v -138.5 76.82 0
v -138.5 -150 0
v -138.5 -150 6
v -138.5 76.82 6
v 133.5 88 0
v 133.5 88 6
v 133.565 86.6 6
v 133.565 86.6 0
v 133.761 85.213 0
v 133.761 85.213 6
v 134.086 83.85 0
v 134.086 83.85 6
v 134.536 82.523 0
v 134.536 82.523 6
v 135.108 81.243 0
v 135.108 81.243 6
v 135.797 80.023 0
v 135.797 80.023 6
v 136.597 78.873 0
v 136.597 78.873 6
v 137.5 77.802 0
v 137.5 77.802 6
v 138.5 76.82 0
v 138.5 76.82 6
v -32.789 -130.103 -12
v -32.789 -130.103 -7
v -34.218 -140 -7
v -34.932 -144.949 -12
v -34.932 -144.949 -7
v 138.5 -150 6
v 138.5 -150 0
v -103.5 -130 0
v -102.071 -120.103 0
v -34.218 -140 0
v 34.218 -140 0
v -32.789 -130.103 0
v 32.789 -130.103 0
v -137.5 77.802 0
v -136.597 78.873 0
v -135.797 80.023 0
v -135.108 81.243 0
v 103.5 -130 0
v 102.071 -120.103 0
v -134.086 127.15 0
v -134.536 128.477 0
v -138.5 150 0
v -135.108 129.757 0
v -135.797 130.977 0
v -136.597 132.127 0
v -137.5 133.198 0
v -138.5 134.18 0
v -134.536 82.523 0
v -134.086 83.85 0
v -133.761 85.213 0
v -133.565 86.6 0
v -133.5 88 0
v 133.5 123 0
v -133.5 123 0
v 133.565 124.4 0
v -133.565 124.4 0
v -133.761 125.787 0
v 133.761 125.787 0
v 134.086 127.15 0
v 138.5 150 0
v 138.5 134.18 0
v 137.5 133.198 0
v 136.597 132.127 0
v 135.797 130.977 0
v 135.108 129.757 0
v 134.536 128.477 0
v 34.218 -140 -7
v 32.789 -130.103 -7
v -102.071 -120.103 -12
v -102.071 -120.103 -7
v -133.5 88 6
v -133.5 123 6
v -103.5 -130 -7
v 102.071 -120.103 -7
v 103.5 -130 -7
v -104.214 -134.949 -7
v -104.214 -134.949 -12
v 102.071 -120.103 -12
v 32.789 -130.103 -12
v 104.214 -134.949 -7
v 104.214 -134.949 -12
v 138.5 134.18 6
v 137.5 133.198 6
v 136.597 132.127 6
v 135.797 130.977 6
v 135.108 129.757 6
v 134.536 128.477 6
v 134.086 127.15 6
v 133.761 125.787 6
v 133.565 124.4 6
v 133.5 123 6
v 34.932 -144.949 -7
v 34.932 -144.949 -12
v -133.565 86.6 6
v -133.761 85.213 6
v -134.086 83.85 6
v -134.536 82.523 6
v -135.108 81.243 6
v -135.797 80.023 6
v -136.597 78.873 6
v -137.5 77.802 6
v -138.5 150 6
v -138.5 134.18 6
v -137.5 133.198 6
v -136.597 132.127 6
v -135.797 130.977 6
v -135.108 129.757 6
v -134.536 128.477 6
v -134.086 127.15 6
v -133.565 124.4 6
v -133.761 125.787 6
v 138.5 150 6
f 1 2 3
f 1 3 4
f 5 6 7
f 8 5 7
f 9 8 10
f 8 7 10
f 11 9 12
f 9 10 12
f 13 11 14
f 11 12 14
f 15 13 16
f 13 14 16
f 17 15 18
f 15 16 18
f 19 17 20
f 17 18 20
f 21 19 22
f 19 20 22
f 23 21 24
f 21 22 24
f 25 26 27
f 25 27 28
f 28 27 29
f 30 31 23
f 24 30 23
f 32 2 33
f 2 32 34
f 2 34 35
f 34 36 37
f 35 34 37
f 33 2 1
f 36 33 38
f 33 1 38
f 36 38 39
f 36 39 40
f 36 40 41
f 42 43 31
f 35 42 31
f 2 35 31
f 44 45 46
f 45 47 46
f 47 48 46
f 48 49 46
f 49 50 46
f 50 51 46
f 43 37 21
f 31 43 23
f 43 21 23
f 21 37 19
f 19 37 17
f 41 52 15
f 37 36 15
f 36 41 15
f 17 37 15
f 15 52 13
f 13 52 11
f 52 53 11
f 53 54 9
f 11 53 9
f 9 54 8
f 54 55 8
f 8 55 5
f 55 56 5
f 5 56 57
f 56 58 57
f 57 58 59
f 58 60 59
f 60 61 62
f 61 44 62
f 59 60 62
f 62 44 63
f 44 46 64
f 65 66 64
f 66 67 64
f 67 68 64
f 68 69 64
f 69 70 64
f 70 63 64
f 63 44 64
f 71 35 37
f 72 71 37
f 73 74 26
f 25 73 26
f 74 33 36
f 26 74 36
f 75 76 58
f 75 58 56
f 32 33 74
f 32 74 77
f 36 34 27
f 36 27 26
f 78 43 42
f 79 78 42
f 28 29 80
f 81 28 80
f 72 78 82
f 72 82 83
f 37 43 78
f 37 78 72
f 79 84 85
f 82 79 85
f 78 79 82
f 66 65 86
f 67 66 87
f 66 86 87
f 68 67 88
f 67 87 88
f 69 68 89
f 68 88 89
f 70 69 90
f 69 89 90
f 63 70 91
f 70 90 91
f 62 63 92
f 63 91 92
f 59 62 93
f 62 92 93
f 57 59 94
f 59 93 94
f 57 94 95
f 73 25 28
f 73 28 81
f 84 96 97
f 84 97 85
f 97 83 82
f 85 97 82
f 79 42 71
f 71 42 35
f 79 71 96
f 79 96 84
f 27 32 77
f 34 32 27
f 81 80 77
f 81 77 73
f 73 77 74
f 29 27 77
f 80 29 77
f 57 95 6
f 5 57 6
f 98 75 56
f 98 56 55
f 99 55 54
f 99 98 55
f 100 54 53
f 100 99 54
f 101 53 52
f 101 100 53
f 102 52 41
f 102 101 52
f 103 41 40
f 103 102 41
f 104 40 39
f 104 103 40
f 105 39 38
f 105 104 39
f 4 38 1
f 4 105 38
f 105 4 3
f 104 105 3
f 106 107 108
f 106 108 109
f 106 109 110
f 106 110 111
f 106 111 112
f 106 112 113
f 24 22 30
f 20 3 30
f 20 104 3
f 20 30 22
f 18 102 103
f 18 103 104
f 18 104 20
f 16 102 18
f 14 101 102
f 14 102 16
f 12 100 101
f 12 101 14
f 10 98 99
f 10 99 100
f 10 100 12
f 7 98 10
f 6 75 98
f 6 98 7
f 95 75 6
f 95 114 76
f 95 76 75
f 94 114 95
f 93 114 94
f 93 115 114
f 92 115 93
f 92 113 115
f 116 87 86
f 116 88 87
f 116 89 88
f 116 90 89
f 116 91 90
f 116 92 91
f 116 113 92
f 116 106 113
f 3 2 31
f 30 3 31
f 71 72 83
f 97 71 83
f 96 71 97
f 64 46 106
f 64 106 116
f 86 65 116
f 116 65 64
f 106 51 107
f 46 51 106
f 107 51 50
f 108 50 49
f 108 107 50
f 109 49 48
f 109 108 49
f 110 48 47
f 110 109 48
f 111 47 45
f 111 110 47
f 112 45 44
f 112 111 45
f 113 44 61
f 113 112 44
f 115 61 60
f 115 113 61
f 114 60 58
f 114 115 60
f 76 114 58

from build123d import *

# Parameters (mm, degrees)
SKETCH1_W           = 277
SKETCH1_H           = 300
BOSS_EXTRUDE1_DEPTH = 6
BOSS_EXTRUDE2_DEPTH = 7
BOSS_EXTRUDE3_DEPTH = 5
CUT_EXTRUDE1_DEPTH  = 19


with BuildPart() as part:
    # Sketch1 → Boss-Extrude1 (new body)
    with BuildSketch(Plane.XY):
        Rectangle(SKETCH1_W, SKETCH1_H)
    extrude(amount=BOSS_EXTRUDE1_DEPTH)

    # Sketch3 → Boss-Extrude2 (add)
    with BuildSketch(Plane(origin=(0, 0, 0), x_dir=(-1, 0, 0), z_dir=(0, 0, -1))):
        Polygon((-103.5, -130), (-34.217967697, -140), (-32.789396269, -130.102566814), (-102.071428571, -120.102566814), align=None)
    boss_extrude2 = extrude(amount=BOSS_EXTRUDE2_DEPTH)

    # Sketch4 → Boss-Extrude3 (add)
    with BuildSketch(Plane(origin=(0, 0, -7), x_dir=(-1, 0, 0), z_dir=(0, 0, -1))):
        Polygon((-102.071428571, -120.102566814), (-32.789396269, -130.102566814), (-34.932253412, -144.948716593), (-104.214285714, -134.948716593), align=None)
    boss_extrude3 = extrude(amount=BOSS_EXTRUDE3_DEPTH)

    # Sketch2 → Cut-Extrude1 (cut, through all)
    with BuildSketch(Plane.XY.offset(6)):
        with BuildLine():
            Line((133.5, 123), (133.5, 88))
            ThreePointArc((133.5, 88), (148.5, 73), (163.5, 88))
            Line((163.5, 88), (163.5, 123))
            ThreePointArc((163.5, 123), (148.5, 138), (133.5, 123))
        make_face()
    cut_extrude1 = extrude(amount=-CUT_EXTRUDE1_DEPTH, mode=Mode.SUBTRACT)

    # Mirror1: Boss-Extrude2, Boss-Extrude3, Cut-Extrude1 across plane
    add(boss_extrude2.mirror(Plane(origin=(0, 0, 0), x_dir=(0, 0, 1), z_dir=(1, 0, 0))))
    add(boss_extrude3.mirror(Plane(origin=(0, 0, 0), x_dir=(0, 0, 1), z_dir=(1, 0, 0))))
    add(cut_extrude1.mirror(Plane(origin=(0, 0, 0), x_dir=(0, 0, 1), z_dir=(1, 0, 0))), mode=Mode.SUBTRACT)


solid = part.part
